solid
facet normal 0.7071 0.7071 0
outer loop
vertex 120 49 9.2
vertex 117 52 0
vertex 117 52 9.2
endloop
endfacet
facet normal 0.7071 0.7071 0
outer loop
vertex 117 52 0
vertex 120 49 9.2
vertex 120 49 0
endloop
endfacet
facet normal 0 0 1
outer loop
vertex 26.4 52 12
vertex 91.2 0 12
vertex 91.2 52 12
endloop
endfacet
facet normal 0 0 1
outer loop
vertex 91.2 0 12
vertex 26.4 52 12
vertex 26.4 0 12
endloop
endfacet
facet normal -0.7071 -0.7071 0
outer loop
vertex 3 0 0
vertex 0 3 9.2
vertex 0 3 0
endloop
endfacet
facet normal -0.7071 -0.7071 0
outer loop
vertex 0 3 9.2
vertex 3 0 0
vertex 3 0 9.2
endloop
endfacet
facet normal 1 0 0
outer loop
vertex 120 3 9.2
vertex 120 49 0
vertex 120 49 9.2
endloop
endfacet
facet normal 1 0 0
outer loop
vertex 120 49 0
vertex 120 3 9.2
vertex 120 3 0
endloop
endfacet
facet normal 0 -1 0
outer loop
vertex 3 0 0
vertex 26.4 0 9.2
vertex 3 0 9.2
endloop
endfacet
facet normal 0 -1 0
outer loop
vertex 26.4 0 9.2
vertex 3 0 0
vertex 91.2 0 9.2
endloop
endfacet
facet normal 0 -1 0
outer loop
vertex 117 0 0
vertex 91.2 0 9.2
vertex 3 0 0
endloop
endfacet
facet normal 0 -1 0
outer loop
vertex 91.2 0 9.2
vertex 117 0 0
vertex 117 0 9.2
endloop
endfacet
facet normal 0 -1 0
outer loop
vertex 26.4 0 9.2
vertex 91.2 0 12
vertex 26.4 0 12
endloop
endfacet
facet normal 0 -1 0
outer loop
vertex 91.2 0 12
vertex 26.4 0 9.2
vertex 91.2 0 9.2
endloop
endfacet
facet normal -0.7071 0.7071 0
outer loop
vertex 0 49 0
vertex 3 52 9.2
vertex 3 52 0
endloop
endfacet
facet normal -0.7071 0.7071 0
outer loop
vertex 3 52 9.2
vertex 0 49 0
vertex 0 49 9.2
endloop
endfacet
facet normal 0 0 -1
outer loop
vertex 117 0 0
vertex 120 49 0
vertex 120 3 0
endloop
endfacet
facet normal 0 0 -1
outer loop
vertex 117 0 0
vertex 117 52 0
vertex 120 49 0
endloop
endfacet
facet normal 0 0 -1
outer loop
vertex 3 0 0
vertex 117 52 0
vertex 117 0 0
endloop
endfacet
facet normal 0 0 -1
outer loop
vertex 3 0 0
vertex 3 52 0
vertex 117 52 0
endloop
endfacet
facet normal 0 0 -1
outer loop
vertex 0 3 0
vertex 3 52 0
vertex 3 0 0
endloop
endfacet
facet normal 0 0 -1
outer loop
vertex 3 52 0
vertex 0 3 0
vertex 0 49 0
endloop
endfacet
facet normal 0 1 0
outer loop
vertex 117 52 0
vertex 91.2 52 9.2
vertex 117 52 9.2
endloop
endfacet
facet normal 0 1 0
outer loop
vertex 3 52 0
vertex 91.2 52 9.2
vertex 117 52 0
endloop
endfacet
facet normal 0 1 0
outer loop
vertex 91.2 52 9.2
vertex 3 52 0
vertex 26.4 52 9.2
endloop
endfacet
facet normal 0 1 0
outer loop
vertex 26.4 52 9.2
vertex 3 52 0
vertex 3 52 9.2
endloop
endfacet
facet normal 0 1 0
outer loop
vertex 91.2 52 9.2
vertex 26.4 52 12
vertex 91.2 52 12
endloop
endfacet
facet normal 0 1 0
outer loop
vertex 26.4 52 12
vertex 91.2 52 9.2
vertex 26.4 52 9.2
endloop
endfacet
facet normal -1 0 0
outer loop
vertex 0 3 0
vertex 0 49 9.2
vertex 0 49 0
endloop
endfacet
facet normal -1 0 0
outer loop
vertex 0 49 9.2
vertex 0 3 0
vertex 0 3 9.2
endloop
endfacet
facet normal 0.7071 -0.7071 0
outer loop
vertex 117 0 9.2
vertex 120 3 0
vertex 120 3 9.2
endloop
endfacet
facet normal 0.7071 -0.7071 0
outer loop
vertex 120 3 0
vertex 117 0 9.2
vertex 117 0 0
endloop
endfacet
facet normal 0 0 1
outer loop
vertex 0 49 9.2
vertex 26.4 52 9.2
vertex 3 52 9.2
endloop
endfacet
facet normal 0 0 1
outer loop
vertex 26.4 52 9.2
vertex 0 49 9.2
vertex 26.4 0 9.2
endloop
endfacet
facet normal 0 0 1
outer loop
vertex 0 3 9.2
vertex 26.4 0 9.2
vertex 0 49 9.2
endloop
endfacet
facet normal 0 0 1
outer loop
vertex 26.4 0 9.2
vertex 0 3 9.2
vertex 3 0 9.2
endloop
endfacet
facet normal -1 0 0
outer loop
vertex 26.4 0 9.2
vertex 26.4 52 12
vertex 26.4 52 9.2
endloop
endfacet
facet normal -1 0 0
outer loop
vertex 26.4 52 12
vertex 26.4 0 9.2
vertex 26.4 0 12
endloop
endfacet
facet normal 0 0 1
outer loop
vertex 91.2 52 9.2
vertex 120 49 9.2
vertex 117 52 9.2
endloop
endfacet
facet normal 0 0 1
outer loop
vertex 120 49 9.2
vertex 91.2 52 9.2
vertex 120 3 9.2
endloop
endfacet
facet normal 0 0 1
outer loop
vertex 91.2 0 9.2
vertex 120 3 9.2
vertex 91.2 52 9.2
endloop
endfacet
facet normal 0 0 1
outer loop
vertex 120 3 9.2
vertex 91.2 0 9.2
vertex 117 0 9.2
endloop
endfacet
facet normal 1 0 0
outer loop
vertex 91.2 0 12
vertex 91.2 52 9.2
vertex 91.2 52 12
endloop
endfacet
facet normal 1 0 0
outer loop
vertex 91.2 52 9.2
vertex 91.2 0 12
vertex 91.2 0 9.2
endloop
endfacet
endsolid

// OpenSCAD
$fn = 32;

// ----------------------------------------------------------------------
// Stepped bar: centerstep, 120 x 52 x 12/9.2 mm
// ----------------------------------------------------------------------

// --- parameters (mm) ---
bar_l = 120;              // bar length, X
bar_w = 52;               // bar width, Y
plate_t = 12;             // thickness of the thick zone, Z
thin_t = 9.2;             // thickness of the thin zone
corner_c = 3;             // corner chamfer of the bar
step_cut = 2.8;           // material removed from the thin zone
thick_from = 26.4;        // start of the thick middle zone
thick_to = 91.2;          // end of the thick middle zone
depth_1 = 2.8;            // depth of cut 1 from the top face
depth_2 = 2.8;            // depth of cut 2 from the top face

profile = [[3, 0], [117, 0], [120, 3], [120, 49], [117, 52], [3, 52], [0, 49], [0, 3]];  // primary outline, 8 points, counter clockwise
void_1 = [[-1, -1], [26.4, -1], [26.4, 53], [-1, 53]];  // thin left end, 4 points
void_2 = [[91.2, -1], [121, -1], [121, 53], [91.2, 53]];  // thin right end, 4 points

// --- the one profile operation ---
difference() {
  linear_extrude(height = plate_t) polygon(points = profile);
  translate([0, 0, plate_t - depth_1])
    linear_extrude(height = depth_1 + 1) polygon(points = void_1);
  translate([0, 0, plate_t - depth_2])
    linear_extrude(height = depth_2 + 1) polygon(points = void_2);
}
